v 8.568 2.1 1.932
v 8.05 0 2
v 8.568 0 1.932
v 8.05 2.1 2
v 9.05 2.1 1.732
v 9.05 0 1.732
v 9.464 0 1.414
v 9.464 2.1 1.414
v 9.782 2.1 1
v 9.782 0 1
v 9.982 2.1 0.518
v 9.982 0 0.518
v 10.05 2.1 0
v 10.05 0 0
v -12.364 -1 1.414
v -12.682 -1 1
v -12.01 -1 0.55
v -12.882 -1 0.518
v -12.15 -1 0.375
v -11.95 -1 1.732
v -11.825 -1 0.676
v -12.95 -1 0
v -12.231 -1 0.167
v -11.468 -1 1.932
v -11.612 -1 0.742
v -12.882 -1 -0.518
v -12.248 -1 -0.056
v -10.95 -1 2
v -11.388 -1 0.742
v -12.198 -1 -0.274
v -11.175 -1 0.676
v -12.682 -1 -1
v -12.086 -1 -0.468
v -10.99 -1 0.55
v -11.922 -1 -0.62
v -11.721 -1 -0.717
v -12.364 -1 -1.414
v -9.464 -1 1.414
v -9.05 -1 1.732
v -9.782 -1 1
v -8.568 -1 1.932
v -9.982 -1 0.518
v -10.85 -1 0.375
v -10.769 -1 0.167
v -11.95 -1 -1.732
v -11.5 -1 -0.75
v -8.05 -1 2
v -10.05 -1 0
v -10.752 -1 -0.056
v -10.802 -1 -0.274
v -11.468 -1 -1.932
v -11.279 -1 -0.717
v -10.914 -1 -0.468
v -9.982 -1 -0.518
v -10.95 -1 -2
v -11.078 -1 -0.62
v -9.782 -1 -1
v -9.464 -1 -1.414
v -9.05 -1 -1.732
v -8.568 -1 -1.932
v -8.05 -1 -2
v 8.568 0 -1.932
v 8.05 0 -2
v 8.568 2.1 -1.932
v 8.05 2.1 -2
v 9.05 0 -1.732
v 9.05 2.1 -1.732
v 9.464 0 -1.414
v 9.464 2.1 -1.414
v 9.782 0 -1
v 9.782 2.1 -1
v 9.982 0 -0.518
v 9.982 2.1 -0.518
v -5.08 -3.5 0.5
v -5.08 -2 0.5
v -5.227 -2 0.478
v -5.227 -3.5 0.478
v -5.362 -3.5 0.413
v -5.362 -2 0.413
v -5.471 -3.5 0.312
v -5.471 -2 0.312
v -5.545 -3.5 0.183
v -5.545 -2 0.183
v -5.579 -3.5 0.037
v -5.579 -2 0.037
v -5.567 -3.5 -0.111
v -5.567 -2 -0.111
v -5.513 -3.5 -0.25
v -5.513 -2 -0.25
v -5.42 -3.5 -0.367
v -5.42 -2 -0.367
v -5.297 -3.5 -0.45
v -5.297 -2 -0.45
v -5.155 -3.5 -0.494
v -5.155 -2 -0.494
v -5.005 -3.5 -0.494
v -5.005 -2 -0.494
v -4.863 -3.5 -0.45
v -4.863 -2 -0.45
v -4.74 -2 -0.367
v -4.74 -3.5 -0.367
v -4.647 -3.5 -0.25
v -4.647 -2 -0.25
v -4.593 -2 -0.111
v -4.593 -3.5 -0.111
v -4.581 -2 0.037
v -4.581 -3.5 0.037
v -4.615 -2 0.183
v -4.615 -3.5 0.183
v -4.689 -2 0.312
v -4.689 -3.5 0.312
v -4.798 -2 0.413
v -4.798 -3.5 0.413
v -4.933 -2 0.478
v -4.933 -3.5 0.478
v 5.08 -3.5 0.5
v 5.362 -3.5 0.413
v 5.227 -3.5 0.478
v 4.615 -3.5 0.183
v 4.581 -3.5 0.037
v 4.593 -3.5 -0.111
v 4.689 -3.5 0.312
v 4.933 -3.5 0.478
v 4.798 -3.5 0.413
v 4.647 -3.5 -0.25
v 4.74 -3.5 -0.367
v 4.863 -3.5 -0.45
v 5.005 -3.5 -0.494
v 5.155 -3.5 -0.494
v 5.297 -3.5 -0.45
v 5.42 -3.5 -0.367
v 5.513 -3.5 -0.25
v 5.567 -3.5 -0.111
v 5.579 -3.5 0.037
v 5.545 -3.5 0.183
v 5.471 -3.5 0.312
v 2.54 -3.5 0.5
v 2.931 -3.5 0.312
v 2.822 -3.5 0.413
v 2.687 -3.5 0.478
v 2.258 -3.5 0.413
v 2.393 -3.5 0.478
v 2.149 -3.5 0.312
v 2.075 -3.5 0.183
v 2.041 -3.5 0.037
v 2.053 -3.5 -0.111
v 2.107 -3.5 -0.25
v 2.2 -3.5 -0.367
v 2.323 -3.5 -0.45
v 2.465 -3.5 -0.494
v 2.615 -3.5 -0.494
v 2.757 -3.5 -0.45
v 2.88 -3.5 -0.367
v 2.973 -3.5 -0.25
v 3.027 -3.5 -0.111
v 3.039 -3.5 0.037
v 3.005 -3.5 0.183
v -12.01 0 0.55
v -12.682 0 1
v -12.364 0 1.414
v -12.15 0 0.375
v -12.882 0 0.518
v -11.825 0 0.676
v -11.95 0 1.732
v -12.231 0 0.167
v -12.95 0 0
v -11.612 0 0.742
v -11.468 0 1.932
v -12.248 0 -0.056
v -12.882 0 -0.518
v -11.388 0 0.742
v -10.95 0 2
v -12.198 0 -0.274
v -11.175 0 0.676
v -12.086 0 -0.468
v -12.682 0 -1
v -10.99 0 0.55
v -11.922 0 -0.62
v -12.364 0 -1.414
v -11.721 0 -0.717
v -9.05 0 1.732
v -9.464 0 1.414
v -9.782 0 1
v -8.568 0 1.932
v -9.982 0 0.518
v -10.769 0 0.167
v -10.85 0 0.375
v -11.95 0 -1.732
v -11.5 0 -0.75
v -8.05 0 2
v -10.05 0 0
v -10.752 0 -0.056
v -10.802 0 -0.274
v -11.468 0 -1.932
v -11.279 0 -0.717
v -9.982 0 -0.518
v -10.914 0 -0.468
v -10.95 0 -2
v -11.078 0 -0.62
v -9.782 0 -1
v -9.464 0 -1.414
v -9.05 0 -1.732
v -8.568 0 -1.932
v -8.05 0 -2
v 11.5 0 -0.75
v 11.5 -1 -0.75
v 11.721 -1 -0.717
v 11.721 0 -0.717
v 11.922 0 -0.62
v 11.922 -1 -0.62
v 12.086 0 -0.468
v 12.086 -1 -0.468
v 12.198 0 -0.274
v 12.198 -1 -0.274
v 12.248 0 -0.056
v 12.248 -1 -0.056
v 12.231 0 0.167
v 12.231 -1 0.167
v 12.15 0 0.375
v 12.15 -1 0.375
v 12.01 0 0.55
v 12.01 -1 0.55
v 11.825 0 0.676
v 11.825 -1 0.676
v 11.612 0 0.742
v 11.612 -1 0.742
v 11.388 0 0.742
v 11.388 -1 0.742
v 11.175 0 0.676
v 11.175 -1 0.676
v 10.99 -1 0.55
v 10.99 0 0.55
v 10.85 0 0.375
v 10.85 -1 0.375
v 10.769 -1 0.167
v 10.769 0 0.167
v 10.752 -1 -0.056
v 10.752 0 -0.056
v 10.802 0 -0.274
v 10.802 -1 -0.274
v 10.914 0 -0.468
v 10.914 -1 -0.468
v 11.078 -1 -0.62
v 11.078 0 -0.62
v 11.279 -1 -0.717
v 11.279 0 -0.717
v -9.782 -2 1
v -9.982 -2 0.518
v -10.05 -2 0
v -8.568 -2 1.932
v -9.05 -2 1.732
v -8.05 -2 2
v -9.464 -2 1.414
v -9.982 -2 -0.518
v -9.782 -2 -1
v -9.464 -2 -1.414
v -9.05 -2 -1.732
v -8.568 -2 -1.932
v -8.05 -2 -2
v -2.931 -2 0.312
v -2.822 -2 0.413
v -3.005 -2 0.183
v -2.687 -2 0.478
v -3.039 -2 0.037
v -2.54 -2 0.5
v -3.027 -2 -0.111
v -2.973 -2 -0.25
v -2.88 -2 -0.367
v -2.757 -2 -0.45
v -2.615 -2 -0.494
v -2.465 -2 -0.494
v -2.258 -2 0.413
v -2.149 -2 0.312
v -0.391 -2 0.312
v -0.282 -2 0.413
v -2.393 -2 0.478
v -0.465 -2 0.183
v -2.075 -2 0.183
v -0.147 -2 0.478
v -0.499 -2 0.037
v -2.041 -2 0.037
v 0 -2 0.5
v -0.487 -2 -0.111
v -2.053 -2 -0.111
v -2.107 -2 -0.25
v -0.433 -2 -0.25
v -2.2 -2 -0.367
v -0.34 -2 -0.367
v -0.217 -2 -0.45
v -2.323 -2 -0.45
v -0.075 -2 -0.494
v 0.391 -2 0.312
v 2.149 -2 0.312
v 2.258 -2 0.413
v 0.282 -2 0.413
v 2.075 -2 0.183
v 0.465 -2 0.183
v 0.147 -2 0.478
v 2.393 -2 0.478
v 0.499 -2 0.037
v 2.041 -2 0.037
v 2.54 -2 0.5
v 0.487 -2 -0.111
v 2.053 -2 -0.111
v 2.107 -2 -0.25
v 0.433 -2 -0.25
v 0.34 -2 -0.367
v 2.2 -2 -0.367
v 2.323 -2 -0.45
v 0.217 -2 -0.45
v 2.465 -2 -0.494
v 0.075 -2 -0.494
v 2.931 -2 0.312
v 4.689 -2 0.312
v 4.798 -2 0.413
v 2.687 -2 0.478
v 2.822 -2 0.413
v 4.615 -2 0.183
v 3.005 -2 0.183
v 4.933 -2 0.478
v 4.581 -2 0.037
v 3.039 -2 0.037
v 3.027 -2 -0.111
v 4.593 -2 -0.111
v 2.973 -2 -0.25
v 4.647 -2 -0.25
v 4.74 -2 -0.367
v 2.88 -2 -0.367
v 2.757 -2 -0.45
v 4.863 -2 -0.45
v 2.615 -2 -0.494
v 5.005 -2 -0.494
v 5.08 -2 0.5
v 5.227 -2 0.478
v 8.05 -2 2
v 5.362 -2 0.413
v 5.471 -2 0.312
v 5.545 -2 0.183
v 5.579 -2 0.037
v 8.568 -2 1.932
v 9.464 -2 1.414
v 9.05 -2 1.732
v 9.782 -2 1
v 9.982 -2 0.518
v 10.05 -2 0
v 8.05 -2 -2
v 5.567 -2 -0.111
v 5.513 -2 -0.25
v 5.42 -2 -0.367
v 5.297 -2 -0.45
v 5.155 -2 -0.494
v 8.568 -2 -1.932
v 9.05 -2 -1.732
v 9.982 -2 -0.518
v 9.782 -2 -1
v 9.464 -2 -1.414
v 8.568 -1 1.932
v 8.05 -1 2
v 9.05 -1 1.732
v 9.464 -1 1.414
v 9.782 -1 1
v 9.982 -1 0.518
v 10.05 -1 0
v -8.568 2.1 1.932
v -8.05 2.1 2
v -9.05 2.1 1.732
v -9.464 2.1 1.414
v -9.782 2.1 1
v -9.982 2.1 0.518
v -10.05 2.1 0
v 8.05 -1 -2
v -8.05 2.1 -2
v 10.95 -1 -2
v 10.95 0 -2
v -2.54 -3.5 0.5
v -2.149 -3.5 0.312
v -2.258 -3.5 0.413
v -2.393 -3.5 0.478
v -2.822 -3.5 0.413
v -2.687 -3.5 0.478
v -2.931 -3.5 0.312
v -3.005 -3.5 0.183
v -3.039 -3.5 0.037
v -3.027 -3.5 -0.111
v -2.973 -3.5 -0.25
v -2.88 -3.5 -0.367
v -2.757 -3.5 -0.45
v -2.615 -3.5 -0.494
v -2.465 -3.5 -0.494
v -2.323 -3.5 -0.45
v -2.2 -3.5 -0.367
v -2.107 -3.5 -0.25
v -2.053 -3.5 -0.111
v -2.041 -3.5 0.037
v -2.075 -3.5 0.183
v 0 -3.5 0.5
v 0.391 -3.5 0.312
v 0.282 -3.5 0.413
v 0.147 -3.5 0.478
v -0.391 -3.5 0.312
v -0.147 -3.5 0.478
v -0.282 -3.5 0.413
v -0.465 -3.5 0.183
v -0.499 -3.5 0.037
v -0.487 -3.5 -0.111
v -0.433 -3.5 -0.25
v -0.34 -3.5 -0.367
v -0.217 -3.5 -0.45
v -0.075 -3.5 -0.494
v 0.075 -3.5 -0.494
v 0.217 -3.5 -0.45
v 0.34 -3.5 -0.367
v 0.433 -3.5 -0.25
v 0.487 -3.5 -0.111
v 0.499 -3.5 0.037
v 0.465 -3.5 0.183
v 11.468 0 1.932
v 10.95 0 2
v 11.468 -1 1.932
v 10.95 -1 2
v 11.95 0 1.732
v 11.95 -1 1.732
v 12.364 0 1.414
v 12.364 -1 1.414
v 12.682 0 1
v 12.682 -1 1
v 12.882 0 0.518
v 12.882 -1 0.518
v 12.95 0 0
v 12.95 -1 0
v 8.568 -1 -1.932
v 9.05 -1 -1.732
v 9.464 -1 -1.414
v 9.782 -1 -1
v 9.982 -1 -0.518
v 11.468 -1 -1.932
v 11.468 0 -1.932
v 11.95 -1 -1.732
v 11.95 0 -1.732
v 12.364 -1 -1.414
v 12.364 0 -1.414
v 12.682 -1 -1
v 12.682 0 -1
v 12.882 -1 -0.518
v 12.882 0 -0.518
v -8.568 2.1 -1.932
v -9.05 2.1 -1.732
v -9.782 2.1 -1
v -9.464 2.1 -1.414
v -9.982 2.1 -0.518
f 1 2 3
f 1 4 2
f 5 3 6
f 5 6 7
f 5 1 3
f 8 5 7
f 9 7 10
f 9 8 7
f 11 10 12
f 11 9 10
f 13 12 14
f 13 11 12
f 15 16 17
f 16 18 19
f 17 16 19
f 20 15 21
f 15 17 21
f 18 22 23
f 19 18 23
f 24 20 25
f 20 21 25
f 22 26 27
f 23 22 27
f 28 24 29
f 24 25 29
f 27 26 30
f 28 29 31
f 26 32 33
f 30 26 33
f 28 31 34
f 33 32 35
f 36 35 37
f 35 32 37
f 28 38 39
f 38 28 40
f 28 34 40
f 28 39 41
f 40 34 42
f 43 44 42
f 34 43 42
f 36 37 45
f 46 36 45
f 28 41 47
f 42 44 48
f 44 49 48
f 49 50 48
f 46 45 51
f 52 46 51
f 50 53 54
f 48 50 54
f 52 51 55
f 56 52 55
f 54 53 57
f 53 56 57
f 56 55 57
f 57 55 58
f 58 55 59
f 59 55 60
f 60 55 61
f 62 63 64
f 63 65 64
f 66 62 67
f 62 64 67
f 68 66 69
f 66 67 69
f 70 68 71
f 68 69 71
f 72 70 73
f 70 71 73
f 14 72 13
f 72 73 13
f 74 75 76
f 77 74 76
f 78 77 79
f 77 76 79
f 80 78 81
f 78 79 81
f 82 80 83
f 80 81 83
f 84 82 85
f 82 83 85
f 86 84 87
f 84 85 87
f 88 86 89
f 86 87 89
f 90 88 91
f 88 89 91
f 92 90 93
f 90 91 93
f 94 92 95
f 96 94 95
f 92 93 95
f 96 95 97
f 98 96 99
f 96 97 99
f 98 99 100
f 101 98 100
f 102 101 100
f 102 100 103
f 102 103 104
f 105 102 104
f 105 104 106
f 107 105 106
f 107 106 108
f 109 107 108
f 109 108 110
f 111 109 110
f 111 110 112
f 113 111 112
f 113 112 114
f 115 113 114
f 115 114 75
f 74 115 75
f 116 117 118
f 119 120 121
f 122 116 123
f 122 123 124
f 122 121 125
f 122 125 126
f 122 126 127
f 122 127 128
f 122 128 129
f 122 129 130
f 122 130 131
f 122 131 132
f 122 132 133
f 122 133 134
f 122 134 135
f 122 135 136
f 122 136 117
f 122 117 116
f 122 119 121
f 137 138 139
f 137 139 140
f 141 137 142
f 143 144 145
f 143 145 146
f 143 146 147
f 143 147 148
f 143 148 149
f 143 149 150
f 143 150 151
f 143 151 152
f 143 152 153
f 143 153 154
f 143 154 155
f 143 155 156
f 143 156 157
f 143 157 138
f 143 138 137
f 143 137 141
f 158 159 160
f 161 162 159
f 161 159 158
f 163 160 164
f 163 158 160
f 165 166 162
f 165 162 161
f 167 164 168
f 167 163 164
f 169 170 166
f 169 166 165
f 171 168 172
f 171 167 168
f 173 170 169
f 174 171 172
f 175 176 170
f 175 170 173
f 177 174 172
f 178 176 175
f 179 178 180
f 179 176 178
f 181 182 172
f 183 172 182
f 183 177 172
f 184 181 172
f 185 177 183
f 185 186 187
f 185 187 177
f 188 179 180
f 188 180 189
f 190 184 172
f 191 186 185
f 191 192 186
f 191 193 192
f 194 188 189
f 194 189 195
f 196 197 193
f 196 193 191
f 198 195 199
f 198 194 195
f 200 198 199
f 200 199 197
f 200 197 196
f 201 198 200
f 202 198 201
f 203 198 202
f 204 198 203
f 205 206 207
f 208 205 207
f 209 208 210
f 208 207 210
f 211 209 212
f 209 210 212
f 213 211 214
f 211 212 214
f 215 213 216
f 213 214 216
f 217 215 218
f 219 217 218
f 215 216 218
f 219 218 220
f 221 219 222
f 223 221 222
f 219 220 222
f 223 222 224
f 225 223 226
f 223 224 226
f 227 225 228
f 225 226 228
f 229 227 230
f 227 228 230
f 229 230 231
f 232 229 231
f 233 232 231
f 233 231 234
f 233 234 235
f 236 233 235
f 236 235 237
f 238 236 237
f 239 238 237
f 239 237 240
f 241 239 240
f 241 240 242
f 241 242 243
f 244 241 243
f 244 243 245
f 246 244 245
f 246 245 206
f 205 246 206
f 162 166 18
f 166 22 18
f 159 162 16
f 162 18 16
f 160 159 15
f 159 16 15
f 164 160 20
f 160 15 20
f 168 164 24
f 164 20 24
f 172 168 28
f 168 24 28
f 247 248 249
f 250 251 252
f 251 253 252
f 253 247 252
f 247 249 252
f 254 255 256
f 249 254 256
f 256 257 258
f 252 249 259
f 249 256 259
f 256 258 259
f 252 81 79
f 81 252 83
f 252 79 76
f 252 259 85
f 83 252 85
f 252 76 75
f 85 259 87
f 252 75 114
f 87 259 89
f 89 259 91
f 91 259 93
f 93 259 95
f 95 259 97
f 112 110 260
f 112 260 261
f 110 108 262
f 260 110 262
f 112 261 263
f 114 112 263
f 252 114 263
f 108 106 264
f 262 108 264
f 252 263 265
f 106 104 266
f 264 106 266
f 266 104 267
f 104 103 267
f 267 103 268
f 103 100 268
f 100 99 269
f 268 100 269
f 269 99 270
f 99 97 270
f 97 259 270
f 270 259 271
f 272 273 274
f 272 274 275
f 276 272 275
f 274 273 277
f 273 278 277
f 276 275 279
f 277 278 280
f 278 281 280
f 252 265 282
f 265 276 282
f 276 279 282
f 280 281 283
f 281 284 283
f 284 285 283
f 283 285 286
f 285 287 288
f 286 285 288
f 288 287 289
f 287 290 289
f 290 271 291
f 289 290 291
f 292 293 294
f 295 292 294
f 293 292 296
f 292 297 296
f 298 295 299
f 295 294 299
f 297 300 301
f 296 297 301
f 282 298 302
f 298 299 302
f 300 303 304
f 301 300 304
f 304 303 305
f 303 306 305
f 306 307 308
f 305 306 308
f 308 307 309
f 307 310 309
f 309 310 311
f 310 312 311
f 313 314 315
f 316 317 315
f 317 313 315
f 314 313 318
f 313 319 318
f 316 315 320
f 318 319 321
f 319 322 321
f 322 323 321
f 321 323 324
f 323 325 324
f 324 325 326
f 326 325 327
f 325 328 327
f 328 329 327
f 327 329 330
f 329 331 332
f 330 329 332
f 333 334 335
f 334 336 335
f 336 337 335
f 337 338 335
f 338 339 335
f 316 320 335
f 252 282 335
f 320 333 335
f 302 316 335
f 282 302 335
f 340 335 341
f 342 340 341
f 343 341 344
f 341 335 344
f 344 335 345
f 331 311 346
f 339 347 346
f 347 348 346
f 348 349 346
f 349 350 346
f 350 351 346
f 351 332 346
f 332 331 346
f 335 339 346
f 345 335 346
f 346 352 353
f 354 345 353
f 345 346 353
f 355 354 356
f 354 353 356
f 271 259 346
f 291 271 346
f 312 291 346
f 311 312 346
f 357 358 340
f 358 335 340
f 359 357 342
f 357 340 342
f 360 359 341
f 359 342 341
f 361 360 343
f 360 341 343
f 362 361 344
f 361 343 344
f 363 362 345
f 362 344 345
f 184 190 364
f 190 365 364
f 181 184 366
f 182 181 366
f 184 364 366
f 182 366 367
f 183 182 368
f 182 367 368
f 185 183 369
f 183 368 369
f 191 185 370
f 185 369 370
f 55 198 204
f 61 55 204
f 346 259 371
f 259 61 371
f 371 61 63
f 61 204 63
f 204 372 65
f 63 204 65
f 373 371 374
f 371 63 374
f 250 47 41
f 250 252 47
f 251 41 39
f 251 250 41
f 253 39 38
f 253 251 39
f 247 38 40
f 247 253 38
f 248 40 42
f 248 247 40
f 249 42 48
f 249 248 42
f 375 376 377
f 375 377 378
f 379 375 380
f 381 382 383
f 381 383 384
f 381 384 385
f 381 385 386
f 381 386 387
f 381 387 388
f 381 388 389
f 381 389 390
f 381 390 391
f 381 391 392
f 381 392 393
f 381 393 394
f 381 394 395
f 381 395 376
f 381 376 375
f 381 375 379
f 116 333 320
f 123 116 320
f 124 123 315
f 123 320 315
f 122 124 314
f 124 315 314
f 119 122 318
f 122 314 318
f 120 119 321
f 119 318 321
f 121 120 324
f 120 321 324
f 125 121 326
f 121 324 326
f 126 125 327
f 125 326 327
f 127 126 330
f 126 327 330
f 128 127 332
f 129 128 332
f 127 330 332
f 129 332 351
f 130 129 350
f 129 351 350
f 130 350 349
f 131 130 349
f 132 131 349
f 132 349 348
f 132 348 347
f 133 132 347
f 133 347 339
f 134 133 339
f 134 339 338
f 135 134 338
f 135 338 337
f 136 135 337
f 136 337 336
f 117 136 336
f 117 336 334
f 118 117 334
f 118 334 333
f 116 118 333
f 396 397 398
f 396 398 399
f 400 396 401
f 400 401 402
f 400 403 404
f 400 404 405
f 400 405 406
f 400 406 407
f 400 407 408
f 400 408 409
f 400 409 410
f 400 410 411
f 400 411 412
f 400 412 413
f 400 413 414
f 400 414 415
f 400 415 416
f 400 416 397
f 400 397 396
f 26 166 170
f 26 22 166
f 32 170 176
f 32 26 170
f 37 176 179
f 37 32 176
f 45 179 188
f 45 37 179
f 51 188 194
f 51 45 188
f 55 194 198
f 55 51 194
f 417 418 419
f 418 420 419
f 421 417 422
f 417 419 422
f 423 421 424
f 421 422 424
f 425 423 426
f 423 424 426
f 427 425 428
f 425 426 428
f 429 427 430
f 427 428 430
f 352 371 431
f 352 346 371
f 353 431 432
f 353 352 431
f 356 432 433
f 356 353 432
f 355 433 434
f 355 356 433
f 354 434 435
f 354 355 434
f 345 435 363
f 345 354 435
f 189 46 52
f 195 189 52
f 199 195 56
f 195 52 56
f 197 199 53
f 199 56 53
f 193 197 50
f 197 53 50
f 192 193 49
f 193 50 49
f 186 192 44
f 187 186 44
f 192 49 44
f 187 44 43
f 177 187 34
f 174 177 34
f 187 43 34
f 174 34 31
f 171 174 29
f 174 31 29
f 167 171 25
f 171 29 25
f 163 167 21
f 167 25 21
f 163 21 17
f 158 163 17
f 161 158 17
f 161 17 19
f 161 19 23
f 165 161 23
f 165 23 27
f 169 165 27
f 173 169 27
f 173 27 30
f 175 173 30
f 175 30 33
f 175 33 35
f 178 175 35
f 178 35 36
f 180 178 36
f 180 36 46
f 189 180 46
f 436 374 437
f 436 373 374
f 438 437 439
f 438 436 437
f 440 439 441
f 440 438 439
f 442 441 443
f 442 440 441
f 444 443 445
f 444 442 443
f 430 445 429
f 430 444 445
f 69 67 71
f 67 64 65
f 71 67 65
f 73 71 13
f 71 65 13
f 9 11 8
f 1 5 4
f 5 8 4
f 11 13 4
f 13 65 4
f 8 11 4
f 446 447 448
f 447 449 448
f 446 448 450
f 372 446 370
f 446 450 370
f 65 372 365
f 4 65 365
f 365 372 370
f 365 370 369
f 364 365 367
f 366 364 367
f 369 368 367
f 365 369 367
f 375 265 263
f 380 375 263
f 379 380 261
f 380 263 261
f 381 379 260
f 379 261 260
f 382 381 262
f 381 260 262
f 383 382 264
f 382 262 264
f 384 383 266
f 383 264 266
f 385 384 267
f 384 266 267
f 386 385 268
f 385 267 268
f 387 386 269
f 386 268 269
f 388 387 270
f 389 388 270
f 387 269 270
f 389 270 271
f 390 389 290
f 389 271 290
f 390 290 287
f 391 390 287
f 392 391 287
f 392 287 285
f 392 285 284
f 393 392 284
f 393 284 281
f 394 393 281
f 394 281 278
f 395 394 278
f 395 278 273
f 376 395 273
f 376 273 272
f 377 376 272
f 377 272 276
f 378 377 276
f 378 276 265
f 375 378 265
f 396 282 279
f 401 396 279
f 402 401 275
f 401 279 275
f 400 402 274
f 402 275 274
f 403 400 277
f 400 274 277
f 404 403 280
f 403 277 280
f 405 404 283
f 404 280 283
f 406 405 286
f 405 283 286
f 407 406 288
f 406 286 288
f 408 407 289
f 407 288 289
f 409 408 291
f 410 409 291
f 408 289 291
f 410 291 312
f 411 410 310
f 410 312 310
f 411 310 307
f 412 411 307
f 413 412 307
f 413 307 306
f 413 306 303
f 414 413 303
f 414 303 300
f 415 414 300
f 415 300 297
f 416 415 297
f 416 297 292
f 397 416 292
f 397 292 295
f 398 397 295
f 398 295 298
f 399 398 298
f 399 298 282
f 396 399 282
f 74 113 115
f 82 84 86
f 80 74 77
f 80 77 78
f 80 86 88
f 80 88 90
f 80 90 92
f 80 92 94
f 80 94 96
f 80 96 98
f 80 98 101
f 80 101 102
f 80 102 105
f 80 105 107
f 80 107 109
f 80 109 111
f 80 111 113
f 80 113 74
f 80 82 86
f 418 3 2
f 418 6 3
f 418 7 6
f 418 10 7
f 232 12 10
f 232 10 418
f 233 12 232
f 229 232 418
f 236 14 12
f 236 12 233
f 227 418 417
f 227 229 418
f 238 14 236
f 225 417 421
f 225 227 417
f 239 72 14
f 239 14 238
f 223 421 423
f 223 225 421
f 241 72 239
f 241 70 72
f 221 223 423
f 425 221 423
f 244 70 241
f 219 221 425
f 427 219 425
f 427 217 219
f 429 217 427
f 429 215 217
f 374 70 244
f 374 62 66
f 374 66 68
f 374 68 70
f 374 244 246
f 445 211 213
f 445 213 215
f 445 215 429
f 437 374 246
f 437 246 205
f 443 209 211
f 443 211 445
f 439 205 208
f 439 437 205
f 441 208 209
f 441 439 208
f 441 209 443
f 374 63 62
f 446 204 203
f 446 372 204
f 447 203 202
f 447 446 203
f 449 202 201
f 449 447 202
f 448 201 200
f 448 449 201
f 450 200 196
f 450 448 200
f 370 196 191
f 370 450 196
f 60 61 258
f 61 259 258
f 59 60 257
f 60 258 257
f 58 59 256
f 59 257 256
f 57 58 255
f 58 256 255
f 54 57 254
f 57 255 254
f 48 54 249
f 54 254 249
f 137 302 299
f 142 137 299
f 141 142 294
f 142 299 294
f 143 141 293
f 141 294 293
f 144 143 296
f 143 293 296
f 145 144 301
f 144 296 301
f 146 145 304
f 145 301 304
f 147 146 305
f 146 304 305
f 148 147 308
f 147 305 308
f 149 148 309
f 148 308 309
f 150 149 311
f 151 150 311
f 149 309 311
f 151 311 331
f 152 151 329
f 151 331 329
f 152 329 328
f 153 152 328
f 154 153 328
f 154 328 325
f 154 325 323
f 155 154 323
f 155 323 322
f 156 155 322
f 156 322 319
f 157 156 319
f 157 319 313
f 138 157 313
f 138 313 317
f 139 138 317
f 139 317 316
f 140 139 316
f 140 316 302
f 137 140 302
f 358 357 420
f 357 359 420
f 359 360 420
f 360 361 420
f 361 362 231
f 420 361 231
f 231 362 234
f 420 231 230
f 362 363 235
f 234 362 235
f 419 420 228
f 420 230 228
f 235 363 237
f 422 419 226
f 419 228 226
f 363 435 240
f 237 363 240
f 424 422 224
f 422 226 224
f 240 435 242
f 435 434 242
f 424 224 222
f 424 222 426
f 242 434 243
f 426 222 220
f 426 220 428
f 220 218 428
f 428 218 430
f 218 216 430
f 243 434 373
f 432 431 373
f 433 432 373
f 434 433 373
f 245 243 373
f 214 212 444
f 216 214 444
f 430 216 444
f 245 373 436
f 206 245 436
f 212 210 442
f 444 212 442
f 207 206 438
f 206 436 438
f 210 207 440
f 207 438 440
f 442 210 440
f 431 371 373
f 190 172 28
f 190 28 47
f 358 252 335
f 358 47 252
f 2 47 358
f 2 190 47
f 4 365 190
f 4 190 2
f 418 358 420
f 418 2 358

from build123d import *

# Parameters (mm, degrees)
SKETCH_1_W          = 20.1
SKETCH_1_H          = 4
EXTRUDE_1_DEPTH     = 2.1
SKETCH_1_3_W        = 25.9
SKETCH_1_3_H        = 4
EXTRUDE_2_DEPTH     = 1
EXTRUDE_START       = -1
SKETCH_1_4_W        = 20.1
SKETCH_1_4_H        = 4
EXTRUDE_4_DEPTH     = 1
FILLET_2_R          = 2
FILLET_1_R          = 2
SKETCH_2_R          = 0.75
CUT_EXTRUDE_1_DEPTH = 14.465233009
EXTRUDE_START_2     = -3.1
SKETCH_3_R          = 0.5
EXTRUDE_3_DEPTH     = 5.6


with BuildPart() as part:
    # 草图1 → 凸台-拉伸1 (new body)
    with BuildSketch(Plane(origin=(0, 0, 0), x_dir=(1, 0, 0), z_dir=(0, 1, 0))):
        Rectangle(SKETCH_1_W, SKETCH_1_H)
    extrude(amount=EXTRUDE_1_DEPTH)

    # 草图1<3> → 凸台-拉伸2 (add)
    with BuildSketch(Plane(origin=(0, 0, 0), x_dir=(1, 0, 0), z_dir=(0, 1, 0))):
        Rectangle(SKETCH_1_3_W, SKETCH_1_3_H)
    extrude(amount=-EXTRUDE_2_DEPTH)

    # 草图1<4> → 凸台-拉伸4 (add)
    with BuildSketch(Plane(origin=(0, 0, 0), x_dir=(1, 0, 0), z_dir=(0, 1, 0)).offset(EXTRUDE_START)):
        Rectangle(SKETCH_1_4_W, SKETCH_1_4_H)
    extrude(amount=-EXTRUDE_4_DEPTH)

    # 圆角2
    fillet_2_edges = [part.edges().sort_by_distance(p)[0] for p in [
        (12.95, -0.5, 2),
        (12.95, -0.5, -2),
        (-12.95, -0.5, 2),
        (-12.95, -0.5, -2),
    ]]
    fillet(fillet_2_edges, radius=FILLET_2_R - 0.0001)  # a hair under: the kernel refuses the full size

    # 圆角1
    fillet_1_edges = [part.edges().sort_by_distance(p)[0] for p in [
        (10.05, 1.05, -2),
        (10.05, 1.05, 2),
        (-10.05, 1.05, 2),
        (-10.05, 1.05, -2),
        (-10.05, -1.5, -2),
        (-10.05, -1.5, 2),
        (10.05, -1.5, 2),
        (10.05, -1.5, -2),
    ]]
    fillet(fillet_1_edges, radius=FILLET_1_R - 0.0001)  # a hair under: the kernel refuses the full size

    # 草图2 → 切除-拉伸1 (cut, through all)
    with BuildSketch(Plane(origin=(0, -1, 0), x_dir=(-1, 0, 0), z_dir=(0, -1, 0))):
        with Locations(Location((11.5, 0, 0), (0, 0, 90))):
            Circle(SKETCH_2_R)
        with Locations(Location((-11.5, 0, 0), (0, 0, 90))):
            Circle(SKETCH_2_R)
    extrude(amount=-CUT_EXTRUDE_1_DEPTH, mode=Mode.SUBTRACT)

    # 草图3 → 凸台-拉伸3 (add)
    with BuildSketch(Plane.XZ.offset(1).offset(EXTRUDE_START_2)):
        with Locations(Location((0, 0, 0), (0, 0, 90))):
            Circle(SKETCH_3_R)
        with Locations(Location((2.54, 0, 0), (0, 0, 90))):
            Circle(SKETCH_3_R)
        with Locations(Location((-2.54, 0, 0), (0, 0, 90))):
            Circle(SKETCH_3_R)
        with Locations(Location((-5.08, 0, 0), (0, 0, 90))):
            Circle(SKETCH_3_R)
        with Locations(Location((5.08, 0, 0), (0, 0, 90))):
            Circle(SKETCH_3_R)
    extrude(amount=EXTRUDE_3_DEPTH)


solid = part.part
